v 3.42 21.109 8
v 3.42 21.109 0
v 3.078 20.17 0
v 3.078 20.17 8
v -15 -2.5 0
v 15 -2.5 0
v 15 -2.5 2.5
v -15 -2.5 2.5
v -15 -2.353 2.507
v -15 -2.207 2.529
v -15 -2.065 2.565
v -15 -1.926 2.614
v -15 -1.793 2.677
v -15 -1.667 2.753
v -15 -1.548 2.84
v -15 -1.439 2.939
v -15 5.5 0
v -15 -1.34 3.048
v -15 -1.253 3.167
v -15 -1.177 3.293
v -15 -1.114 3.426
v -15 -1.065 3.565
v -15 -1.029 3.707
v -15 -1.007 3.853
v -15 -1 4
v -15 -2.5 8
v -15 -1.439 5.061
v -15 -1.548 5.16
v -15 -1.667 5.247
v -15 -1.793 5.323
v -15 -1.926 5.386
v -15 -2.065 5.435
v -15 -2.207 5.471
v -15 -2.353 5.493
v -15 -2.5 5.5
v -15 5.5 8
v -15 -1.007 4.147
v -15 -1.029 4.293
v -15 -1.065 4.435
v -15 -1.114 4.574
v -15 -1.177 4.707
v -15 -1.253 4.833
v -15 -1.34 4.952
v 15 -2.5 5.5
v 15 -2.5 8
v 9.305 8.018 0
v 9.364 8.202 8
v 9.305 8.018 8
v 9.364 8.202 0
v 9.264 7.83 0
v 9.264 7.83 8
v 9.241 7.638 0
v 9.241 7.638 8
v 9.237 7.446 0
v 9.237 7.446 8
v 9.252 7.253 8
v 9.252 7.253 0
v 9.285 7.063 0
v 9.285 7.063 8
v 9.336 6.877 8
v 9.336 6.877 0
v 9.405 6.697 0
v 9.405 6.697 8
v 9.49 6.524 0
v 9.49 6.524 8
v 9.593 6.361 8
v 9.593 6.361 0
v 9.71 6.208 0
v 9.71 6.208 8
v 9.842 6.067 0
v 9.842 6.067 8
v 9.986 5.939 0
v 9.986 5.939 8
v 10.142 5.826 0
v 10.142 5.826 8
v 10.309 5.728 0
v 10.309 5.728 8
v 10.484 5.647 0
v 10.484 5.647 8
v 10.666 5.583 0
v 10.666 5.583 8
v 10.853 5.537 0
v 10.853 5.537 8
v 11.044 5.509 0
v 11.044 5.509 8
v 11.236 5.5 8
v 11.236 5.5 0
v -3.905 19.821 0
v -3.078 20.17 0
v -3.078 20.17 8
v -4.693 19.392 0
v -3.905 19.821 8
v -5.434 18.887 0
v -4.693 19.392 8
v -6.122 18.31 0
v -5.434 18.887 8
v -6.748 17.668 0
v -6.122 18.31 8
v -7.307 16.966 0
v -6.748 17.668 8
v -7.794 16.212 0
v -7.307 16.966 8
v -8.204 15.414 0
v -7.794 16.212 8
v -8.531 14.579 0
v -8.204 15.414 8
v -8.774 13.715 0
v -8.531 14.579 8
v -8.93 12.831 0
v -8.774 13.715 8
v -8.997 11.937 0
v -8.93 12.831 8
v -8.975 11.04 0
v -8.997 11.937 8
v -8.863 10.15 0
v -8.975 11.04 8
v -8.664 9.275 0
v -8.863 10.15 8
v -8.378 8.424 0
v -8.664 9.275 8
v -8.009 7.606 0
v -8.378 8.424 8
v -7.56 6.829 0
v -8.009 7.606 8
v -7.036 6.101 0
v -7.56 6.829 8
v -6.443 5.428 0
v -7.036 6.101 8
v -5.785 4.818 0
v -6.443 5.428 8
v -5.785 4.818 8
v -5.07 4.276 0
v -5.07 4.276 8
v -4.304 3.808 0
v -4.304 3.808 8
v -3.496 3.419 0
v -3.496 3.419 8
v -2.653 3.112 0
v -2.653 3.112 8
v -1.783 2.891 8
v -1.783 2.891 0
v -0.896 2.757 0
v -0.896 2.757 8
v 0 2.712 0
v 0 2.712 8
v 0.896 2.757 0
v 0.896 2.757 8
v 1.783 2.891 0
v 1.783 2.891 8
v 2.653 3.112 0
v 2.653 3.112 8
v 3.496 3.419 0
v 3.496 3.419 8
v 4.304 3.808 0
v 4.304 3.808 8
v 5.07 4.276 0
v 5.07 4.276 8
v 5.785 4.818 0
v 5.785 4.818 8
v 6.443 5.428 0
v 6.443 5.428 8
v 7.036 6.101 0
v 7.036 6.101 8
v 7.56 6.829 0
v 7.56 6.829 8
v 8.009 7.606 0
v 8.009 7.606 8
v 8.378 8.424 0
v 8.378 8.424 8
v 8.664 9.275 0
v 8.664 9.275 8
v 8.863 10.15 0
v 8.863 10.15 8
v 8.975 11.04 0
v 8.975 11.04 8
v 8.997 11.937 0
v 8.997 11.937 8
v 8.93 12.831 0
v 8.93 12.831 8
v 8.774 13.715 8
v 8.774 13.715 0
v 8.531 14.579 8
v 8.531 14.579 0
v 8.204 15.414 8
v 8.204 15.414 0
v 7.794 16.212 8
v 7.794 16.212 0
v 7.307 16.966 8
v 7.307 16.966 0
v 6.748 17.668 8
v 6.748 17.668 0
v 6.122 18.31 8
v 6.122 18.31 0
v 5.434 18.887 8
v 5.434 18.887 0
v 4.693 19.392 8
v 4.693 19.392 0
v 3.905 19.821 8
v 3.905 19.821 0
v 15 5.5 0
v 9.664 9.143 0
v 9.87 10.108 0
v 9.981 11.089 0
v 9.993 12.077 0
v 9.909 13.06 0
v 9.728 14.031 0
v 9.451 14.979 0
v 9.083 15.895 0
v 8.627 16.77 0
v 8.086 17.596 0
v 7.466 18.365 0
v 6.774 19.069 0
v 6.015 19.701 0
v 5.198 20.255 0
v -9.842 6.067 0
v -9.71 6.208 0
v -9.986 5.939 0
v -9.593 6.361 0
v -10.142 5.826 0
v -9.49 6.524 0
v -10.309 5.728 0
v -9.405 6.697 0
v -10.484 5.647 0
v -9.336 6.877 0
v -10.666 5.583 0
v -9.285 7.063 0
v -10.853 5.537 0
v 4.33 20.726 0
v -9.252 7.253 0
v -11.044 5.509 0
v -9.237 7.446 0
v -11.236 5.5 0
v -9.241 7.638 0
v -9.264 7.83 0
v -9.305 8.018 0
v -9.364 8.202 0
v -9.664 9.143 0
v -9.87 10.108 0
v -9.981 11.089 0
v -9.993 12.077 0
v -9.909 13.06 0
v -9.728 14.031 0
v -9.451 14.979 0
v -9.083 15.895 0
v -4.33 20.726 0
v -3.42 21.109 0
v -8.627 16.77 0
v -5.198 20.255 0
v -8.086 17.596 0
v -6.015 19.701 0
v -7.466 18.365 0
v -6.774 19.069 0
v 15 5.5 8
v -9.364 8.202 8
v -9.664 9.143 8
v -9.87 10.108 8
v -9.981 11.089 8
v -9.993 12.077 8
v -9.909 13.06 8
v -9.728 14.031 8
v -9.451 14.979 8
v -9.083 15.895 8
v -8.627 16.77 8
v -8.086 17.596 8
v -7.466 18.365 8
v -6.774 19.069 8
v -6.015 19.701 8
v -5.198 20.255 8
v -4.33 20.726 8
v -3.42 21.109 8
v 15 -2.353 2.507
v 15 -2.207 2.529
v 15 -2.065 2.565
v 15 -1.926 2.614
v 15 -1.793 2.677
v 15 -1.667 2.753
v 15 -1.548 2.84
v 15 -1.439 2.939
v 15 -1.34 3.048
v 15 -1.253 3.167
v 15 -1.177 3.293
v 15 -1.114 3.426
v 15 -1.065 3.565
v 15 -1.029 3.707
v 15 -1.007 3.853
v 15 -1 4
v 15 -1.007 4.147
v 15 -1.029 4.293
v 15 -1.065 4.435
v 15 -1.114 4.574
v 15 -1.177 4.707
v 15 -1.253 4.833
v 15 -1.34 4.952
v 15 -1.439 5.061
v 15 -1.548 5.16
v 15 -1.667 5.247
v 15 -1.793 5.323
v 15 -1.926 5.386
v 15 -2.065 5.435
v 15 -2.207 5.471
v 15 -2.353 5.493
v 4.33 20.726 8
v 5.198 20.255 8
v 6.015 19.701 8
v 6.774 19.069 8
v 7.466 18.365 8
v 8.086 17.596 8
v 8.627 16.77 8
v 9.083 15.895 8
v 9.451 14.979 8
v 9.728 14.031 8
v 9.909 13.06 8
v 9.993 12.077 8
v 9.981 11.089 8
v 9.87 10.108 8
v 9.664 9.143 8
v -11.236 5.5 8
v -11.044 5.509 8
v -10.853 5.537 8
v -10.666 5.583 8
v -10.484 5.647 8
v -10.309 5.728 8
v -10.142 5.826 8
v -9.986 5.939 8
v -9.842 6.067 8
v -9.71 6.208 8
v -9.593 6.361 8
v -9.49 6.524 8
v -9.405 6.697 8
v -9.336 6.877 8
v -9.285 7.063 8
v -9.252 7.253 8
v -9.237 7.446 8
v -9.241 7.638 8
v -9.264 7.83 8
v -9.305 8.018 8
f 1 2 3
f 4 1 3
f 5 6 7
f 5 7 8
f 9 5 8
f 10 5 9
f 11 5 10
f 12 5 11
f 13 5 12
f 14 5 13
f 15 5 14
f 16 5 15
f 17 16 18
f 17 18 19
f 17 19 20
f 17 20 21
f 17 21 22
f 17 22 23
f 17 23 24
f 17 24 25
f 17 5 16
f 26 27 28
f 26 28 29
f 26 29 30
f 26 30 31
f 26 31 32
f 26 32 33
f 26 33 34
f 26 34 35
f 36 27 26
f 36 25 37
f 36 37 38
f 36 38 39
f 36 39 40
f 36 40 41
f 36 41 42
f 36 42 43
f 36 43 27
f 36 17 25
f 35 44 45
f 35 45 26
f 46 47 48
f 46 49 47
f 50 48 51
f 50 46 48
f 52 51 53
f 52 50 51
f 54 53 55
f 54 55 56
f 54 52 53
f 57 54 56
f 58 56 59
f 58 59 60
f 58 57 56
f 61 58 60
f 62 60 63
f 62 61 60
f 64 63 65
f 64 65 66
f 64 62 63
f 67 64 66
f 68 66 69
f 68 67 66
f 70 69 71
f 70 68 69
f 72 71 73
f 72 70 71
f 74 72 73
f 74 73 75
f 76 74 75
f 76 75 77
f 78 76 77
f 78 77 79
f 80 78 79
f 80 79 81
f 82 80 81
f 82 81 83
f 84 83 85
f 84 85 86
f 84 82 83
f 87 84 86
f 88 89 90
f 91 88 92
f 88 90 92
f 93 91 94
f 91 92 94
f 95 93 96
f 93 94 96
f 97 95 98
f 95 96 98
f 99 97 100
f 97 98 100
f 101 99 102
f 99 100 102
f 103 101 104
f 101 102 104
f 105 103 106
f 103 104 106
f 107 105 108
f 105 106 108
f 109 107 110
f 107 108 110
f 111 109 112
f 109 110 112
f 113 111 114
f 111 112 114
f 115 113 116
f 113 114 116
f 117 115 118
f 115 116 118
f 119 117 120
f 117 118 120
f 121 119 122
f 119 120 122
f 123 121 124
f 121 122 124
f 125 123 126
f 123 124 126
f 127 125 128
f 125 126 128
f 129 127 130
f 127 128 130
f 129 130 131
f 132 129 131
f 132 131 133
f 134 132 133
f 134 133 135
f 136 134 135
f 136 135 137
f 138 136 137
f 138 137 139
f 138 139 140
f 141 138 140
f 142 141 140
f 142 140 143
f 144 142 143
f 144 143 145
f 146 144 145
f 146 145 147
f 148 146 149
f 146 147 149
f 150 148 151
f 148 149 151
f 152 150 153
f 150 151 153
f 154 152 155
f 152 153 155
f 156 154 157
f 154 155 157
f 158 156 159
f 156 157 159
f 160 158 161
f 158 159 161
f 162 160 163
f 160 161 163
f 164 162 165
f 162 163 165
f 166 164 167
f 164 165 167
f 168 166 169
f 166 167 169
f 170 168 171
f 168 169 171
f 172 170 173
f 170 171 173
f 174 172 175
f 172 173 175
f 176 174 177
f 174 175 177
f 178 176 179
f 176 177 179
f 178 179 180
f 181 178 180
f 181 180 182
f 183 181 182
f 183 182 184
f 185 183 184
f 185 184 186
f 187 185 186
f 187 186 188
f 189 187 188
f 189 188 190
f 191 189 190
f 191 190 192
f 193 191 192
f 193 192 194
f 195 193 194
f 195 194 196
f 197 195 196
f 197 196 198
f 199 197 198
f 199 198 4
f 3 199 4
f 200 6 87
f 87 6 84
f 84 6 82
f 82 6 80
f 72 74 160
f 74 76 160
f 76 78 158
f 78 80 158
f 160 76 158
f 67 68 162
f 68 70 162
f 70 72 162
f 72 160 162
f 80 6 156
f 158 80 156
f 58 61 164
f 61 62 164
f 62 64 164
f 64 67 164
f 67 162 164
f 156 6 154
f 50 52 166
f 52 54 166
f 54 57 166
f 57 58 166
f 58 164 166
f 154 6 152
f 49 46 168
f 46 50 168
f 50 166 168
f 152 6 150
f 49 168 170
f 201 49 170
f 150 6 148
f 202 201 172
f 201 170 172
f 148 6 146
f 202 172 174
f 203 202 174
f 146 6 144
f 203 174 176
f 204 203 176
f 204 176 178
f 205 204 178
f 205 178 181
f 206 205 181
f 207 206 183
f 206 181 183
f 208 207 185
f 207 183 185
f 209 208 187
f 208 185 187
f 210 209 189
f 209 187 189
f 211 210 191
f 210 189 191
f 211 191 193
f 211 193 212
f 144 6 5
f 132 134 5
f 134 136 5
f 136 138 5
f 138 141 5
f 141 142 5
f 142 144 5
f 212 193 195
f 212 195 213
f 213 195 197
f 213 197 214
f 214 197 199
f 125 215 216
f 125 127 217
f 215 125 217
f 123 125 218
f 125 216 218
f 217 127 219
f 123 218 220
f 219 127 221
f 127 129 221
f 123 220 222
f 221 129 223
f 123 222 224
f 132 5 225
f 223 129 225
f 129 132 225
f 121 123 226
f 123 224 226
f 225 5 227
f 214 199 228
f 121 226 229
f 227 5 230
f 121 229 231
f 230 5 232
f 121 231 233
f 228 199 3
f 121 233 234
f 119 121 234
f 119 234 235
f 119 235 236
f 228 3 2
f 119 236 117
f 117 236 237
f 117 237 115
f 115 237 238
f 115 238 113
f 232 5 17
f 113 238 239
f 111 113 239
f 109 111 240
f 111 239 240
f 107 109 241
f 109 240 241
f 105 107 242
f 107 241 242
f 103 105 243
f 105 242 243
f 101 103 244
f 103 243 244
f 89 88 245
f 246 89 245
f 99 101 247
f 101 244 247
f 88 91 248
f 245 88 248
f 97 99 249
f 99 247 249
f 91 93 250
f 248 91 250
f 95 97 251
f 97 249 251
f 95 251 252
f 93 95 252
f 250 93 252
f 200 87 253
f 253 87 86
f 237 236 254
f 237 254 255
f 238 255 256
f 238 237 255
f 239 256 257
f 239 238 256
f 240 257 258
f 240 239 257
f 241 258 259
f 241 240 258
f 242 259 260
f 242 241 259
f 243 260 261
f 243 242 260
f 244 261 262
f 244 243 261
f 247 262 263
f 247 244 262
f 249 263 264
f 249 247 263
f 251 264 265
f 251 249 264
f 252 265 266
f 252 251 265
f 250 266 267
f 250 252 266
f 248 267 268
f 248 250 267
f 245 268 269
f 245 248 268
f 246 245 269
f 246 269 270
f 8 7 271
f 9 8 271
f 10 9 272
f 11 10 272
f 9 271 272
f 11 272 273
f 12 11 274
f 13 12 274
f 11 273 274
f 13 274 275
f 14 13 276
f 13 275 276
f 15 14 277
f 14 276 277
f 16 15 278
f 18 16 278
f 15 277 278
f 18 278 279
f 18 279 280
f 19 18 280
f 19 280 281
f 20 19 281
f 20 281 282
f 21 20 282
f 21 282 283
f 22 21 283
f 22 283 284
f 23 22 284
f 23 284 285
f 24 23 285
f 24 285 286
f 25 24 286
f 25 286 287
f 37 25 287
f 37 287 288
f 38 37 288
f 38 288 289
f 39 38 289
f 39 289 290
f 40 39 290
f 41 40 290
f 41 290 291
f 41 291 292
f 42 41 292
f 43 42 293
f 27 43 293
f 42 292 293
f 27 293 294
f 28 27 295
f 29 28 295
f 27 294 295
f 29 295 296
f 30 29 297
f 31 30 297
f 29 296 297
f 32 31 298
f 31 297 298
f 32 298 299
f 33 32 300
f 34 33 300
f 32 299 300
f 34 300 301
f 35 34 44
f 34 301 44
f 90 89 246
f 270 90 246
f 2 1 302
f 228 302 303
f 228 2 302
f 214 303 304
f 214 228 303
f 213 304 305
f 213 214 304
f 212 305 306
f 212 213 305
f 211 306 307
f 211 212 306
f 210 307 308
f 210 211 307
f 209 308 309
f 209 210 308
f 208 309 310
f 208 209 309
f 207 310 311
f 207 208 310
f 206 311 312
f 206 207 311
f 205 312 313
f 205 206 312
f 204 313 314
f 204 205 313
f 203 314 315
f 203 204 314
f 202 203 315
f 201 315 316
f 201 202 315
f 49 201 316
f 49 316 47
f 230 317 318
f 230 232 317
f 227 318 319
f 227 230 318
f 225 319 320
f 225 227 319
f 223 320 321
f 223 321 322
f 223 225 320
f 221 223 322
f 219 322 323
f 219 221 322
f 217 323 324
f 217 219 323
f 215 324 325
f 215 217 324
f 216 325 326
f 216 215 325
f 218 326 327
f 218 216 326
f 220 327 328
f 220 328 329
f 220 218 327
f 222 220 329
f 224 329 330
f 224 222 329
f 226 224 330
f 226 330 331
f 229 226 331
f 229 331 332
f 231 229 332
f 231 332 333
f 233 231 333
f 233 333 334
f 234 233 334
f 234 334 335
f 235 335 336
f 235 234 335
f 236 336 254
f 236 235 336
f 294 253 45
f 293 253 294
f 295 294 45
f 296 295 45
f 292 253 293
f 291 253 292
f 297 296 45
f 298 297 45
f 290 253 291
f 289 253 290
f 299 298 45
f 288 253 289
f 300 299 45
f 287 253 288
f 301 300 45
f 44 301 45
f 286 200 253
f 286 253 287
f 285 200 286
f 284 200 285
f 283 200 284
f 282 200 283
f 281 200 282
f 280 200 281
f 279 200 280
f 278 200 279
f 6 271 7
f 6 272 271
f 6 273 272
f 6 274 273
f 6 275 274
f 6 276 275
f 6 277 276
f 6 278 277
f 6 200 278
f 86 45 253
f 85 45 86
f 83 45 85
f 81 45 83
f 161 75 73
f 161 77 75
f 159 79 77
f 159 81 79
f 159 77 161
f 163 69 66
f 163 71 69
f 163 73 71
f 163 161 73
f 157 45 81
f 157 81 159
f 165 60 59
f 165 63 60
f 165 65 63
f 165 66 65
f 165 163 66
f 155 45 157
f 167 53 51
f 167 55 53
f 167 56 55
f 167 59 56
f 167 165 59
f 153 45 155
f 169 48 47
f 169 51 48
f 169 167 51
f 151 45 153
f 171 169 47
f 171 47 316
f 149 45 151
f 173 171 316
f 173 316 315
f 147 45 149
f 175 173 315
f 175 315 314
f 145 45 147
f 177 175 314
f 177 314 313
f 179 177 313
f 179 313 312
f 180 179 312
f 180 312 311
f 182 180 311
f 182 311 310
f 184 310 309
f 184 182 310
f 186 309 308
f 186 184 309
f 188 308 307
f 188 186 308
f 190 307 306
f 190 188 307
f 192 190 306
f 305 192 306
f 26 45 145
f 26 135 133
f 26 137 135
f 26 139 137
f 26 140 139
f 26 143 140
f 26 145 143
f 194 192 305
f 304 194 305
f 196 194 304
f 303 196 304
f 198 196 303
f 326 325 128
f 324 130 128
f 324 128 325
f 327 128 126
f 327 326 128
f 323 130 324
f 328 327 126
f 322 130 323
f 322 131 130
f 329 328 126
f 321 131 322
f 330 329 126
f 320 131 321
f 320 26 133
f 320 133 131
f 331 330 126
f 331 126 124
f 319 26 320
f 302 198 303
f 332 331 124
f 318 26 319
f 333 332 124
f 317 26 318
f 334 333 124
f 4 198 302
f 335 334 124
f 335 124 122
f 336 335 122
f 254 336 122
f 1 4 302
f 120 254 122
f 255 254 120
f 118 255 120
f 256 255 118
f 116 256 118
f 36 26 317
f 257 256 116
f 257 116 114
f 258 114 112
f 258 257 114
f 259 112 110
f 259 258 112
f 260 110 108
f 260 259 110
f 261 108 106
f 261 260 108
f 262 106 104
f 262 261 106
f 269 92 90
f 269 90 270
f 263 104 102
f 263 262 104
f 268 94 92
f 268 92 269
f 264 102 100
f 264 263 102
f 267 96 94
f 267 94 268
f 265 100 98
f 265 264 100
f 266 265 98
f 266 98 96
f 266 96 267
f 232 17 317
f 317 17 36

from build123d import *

# Parameters (mm, degrees)
BOSS_EXTRUDE1_DEPTH = 8
SKETCH2_R           = 9
CUT_EXTRUDE1_DEPTH  = 35
SKETCH3_W           = 0.5
SKETCH3_H           = 1.875425002
CUT_EXTRUDE2_DEPTH  = 25
SKETCH4_R           = 1.5
CUT_EXTRUDE3_DEPTH  = 110
SKETCH6_W           = 5
SKETCH6_H           = 7.147198513
CUT_EXTRUDE4_DEPTH  = 10
FILLET1_R           = 0.5
SKETCH8_W           = 8
SKETCH8_H           = 3
BOSS_EXTRUDE2_DEPTH = 30
SKETCH9_R           = 9
CUT_EXTRUDE5_DEPTH  = 30
FILLET2_R           = 2
CUT_EXTRUDE7_DEPTH  = 30


with BuildPart() as part:
    # Sketch1 → Boss-Extrude1 (new body)
    with BuildSketch(Plane.XY):
        with BuildLine():
            Line((3.89007335, 2.5), (15, 2.5))
            Line((15, 2.5), (15, -2.5))
            Line((15, -2.5), (-15, -2.5))
            Line((-15, -2.5), (-15, 2.5))
            Line((-15, 2.5), (-3.89007335, 2.5))
            ThreePointArc((-3.89007335, 2.5), (0, 21.71234657), (3.89007335, 2.5))
        make_face()
    extrude(amount=BOSS_EXTRUDE1_DEPTH)

    # Sketch2 → Cut-Extrude1 (cut)
    with BuildSketch(Plane.XY.offset(8)):
        with Locations((0, 11.71234657)):
            Circle(SKETCH2_R)
    extrude(amount=-CUT_EXTRUDE1_DEPTH, mode=Mode.SUBTRACT)

    # Sketch3 → Cut-Extrude2 (cut)
    with BuildSketch(Plane(origin=(0, 0, 0), x_dir=(-1, 0, 0), z_dir=(0, 0, -1))):
        with Locations((0, 21.521483579)):
            Rectangle(SKETCH3_W, SKETCH3_H)
    extrude(amount=-CUT_EXTRUDE2_DEPTH, mode=Mode.SUBTRACT)

    # Sketch4 → Cut-Extrude3 (cut)
    with BuildSketch(Plane(origin=(15, 0, 0), x_dir=(0, 0, -1), z_dir=(1, 0, 0))):
        with Locations((-4, -2.5)):
            Circle(SKETCH4_R)
    extrude(amount=-CUT_EXTRUDE3_DEPTH, mode=Mode.SUBTRACT)

    # Sketch6 → Cut-Extrude4 (cut)
    with BuildSketch(Plane.XY.offset(8)):
        with Locations((0, 22.731746569)):
            Rectangle(SKETCH6_W, SKETCH6_H)
    extrude(amount=-CUT_EXTRUDE4_DEPTH, mode=Mode.SUBTRACT)

    # Fillet1
    fillet1_edges = [part.edges().sort_by_distance(p)[0] for p in [
        (-3.89007335, 2.5, 4),
        (3.89007335, 2.5, 4),
    ]]
    fillet(fillet1_edges, radius=FILLET1_R)

    # Sketch8 → Boss-Extrude2 (add)
    with BuildSketch(Plane.ZY.offset(15)):
        with Locations((4, 4)):
            Rectangle(SKETCH8_W, SKETCH8_H)
    extrude(amount=-BOSS_EXTRUDE2_DEPTH)

    # Sketch9 → Cut-Extrude5 (cut)
    with BuildSketch(Plane(origin=(0, 0, 0), x_dir=(-1, 0, 0), z_dir=(0, 0, -1))):
        with Locations((0, 11.71234657)):
            Circle(SKETCH9_R)
    extrude(amount=-CUT_EXTRUDE5_DEPTH, mode=Mode.SUBTRACT)

    # Fillet2
    fillet2_edges = [part.edges().sort_by_distance(p)[0] for p in [
        (-7.836245918, 5.5, 4),
        (7.836245918, 5.5, 4),
    ]]
    fillet(fillet2_edges, radius=FILLET2_R)

    # Sketch10 → Cut-Extrude7 (cut)
    with BuildSketch(Plane(origin=(0, 0, 0), x_dir=(-1, 0, 0), z_dir=(0, 0, -1))):
        with BuildLine():
            Line((0, 11.71234657), (3.420201433, 21.109272778))
            ThreePointArc((3.420201433, 21.109272778), (0, 24.529474212), (-3.420201433, 21.109272778))
            Line((-3.420201433, 21.109272778), (0, 11.71234657))
        make_face()
    extrude(amount=-CUT_EXTRUDE7_DEPTH, mode=Mode.SUBTRACT)


solid = part.part
